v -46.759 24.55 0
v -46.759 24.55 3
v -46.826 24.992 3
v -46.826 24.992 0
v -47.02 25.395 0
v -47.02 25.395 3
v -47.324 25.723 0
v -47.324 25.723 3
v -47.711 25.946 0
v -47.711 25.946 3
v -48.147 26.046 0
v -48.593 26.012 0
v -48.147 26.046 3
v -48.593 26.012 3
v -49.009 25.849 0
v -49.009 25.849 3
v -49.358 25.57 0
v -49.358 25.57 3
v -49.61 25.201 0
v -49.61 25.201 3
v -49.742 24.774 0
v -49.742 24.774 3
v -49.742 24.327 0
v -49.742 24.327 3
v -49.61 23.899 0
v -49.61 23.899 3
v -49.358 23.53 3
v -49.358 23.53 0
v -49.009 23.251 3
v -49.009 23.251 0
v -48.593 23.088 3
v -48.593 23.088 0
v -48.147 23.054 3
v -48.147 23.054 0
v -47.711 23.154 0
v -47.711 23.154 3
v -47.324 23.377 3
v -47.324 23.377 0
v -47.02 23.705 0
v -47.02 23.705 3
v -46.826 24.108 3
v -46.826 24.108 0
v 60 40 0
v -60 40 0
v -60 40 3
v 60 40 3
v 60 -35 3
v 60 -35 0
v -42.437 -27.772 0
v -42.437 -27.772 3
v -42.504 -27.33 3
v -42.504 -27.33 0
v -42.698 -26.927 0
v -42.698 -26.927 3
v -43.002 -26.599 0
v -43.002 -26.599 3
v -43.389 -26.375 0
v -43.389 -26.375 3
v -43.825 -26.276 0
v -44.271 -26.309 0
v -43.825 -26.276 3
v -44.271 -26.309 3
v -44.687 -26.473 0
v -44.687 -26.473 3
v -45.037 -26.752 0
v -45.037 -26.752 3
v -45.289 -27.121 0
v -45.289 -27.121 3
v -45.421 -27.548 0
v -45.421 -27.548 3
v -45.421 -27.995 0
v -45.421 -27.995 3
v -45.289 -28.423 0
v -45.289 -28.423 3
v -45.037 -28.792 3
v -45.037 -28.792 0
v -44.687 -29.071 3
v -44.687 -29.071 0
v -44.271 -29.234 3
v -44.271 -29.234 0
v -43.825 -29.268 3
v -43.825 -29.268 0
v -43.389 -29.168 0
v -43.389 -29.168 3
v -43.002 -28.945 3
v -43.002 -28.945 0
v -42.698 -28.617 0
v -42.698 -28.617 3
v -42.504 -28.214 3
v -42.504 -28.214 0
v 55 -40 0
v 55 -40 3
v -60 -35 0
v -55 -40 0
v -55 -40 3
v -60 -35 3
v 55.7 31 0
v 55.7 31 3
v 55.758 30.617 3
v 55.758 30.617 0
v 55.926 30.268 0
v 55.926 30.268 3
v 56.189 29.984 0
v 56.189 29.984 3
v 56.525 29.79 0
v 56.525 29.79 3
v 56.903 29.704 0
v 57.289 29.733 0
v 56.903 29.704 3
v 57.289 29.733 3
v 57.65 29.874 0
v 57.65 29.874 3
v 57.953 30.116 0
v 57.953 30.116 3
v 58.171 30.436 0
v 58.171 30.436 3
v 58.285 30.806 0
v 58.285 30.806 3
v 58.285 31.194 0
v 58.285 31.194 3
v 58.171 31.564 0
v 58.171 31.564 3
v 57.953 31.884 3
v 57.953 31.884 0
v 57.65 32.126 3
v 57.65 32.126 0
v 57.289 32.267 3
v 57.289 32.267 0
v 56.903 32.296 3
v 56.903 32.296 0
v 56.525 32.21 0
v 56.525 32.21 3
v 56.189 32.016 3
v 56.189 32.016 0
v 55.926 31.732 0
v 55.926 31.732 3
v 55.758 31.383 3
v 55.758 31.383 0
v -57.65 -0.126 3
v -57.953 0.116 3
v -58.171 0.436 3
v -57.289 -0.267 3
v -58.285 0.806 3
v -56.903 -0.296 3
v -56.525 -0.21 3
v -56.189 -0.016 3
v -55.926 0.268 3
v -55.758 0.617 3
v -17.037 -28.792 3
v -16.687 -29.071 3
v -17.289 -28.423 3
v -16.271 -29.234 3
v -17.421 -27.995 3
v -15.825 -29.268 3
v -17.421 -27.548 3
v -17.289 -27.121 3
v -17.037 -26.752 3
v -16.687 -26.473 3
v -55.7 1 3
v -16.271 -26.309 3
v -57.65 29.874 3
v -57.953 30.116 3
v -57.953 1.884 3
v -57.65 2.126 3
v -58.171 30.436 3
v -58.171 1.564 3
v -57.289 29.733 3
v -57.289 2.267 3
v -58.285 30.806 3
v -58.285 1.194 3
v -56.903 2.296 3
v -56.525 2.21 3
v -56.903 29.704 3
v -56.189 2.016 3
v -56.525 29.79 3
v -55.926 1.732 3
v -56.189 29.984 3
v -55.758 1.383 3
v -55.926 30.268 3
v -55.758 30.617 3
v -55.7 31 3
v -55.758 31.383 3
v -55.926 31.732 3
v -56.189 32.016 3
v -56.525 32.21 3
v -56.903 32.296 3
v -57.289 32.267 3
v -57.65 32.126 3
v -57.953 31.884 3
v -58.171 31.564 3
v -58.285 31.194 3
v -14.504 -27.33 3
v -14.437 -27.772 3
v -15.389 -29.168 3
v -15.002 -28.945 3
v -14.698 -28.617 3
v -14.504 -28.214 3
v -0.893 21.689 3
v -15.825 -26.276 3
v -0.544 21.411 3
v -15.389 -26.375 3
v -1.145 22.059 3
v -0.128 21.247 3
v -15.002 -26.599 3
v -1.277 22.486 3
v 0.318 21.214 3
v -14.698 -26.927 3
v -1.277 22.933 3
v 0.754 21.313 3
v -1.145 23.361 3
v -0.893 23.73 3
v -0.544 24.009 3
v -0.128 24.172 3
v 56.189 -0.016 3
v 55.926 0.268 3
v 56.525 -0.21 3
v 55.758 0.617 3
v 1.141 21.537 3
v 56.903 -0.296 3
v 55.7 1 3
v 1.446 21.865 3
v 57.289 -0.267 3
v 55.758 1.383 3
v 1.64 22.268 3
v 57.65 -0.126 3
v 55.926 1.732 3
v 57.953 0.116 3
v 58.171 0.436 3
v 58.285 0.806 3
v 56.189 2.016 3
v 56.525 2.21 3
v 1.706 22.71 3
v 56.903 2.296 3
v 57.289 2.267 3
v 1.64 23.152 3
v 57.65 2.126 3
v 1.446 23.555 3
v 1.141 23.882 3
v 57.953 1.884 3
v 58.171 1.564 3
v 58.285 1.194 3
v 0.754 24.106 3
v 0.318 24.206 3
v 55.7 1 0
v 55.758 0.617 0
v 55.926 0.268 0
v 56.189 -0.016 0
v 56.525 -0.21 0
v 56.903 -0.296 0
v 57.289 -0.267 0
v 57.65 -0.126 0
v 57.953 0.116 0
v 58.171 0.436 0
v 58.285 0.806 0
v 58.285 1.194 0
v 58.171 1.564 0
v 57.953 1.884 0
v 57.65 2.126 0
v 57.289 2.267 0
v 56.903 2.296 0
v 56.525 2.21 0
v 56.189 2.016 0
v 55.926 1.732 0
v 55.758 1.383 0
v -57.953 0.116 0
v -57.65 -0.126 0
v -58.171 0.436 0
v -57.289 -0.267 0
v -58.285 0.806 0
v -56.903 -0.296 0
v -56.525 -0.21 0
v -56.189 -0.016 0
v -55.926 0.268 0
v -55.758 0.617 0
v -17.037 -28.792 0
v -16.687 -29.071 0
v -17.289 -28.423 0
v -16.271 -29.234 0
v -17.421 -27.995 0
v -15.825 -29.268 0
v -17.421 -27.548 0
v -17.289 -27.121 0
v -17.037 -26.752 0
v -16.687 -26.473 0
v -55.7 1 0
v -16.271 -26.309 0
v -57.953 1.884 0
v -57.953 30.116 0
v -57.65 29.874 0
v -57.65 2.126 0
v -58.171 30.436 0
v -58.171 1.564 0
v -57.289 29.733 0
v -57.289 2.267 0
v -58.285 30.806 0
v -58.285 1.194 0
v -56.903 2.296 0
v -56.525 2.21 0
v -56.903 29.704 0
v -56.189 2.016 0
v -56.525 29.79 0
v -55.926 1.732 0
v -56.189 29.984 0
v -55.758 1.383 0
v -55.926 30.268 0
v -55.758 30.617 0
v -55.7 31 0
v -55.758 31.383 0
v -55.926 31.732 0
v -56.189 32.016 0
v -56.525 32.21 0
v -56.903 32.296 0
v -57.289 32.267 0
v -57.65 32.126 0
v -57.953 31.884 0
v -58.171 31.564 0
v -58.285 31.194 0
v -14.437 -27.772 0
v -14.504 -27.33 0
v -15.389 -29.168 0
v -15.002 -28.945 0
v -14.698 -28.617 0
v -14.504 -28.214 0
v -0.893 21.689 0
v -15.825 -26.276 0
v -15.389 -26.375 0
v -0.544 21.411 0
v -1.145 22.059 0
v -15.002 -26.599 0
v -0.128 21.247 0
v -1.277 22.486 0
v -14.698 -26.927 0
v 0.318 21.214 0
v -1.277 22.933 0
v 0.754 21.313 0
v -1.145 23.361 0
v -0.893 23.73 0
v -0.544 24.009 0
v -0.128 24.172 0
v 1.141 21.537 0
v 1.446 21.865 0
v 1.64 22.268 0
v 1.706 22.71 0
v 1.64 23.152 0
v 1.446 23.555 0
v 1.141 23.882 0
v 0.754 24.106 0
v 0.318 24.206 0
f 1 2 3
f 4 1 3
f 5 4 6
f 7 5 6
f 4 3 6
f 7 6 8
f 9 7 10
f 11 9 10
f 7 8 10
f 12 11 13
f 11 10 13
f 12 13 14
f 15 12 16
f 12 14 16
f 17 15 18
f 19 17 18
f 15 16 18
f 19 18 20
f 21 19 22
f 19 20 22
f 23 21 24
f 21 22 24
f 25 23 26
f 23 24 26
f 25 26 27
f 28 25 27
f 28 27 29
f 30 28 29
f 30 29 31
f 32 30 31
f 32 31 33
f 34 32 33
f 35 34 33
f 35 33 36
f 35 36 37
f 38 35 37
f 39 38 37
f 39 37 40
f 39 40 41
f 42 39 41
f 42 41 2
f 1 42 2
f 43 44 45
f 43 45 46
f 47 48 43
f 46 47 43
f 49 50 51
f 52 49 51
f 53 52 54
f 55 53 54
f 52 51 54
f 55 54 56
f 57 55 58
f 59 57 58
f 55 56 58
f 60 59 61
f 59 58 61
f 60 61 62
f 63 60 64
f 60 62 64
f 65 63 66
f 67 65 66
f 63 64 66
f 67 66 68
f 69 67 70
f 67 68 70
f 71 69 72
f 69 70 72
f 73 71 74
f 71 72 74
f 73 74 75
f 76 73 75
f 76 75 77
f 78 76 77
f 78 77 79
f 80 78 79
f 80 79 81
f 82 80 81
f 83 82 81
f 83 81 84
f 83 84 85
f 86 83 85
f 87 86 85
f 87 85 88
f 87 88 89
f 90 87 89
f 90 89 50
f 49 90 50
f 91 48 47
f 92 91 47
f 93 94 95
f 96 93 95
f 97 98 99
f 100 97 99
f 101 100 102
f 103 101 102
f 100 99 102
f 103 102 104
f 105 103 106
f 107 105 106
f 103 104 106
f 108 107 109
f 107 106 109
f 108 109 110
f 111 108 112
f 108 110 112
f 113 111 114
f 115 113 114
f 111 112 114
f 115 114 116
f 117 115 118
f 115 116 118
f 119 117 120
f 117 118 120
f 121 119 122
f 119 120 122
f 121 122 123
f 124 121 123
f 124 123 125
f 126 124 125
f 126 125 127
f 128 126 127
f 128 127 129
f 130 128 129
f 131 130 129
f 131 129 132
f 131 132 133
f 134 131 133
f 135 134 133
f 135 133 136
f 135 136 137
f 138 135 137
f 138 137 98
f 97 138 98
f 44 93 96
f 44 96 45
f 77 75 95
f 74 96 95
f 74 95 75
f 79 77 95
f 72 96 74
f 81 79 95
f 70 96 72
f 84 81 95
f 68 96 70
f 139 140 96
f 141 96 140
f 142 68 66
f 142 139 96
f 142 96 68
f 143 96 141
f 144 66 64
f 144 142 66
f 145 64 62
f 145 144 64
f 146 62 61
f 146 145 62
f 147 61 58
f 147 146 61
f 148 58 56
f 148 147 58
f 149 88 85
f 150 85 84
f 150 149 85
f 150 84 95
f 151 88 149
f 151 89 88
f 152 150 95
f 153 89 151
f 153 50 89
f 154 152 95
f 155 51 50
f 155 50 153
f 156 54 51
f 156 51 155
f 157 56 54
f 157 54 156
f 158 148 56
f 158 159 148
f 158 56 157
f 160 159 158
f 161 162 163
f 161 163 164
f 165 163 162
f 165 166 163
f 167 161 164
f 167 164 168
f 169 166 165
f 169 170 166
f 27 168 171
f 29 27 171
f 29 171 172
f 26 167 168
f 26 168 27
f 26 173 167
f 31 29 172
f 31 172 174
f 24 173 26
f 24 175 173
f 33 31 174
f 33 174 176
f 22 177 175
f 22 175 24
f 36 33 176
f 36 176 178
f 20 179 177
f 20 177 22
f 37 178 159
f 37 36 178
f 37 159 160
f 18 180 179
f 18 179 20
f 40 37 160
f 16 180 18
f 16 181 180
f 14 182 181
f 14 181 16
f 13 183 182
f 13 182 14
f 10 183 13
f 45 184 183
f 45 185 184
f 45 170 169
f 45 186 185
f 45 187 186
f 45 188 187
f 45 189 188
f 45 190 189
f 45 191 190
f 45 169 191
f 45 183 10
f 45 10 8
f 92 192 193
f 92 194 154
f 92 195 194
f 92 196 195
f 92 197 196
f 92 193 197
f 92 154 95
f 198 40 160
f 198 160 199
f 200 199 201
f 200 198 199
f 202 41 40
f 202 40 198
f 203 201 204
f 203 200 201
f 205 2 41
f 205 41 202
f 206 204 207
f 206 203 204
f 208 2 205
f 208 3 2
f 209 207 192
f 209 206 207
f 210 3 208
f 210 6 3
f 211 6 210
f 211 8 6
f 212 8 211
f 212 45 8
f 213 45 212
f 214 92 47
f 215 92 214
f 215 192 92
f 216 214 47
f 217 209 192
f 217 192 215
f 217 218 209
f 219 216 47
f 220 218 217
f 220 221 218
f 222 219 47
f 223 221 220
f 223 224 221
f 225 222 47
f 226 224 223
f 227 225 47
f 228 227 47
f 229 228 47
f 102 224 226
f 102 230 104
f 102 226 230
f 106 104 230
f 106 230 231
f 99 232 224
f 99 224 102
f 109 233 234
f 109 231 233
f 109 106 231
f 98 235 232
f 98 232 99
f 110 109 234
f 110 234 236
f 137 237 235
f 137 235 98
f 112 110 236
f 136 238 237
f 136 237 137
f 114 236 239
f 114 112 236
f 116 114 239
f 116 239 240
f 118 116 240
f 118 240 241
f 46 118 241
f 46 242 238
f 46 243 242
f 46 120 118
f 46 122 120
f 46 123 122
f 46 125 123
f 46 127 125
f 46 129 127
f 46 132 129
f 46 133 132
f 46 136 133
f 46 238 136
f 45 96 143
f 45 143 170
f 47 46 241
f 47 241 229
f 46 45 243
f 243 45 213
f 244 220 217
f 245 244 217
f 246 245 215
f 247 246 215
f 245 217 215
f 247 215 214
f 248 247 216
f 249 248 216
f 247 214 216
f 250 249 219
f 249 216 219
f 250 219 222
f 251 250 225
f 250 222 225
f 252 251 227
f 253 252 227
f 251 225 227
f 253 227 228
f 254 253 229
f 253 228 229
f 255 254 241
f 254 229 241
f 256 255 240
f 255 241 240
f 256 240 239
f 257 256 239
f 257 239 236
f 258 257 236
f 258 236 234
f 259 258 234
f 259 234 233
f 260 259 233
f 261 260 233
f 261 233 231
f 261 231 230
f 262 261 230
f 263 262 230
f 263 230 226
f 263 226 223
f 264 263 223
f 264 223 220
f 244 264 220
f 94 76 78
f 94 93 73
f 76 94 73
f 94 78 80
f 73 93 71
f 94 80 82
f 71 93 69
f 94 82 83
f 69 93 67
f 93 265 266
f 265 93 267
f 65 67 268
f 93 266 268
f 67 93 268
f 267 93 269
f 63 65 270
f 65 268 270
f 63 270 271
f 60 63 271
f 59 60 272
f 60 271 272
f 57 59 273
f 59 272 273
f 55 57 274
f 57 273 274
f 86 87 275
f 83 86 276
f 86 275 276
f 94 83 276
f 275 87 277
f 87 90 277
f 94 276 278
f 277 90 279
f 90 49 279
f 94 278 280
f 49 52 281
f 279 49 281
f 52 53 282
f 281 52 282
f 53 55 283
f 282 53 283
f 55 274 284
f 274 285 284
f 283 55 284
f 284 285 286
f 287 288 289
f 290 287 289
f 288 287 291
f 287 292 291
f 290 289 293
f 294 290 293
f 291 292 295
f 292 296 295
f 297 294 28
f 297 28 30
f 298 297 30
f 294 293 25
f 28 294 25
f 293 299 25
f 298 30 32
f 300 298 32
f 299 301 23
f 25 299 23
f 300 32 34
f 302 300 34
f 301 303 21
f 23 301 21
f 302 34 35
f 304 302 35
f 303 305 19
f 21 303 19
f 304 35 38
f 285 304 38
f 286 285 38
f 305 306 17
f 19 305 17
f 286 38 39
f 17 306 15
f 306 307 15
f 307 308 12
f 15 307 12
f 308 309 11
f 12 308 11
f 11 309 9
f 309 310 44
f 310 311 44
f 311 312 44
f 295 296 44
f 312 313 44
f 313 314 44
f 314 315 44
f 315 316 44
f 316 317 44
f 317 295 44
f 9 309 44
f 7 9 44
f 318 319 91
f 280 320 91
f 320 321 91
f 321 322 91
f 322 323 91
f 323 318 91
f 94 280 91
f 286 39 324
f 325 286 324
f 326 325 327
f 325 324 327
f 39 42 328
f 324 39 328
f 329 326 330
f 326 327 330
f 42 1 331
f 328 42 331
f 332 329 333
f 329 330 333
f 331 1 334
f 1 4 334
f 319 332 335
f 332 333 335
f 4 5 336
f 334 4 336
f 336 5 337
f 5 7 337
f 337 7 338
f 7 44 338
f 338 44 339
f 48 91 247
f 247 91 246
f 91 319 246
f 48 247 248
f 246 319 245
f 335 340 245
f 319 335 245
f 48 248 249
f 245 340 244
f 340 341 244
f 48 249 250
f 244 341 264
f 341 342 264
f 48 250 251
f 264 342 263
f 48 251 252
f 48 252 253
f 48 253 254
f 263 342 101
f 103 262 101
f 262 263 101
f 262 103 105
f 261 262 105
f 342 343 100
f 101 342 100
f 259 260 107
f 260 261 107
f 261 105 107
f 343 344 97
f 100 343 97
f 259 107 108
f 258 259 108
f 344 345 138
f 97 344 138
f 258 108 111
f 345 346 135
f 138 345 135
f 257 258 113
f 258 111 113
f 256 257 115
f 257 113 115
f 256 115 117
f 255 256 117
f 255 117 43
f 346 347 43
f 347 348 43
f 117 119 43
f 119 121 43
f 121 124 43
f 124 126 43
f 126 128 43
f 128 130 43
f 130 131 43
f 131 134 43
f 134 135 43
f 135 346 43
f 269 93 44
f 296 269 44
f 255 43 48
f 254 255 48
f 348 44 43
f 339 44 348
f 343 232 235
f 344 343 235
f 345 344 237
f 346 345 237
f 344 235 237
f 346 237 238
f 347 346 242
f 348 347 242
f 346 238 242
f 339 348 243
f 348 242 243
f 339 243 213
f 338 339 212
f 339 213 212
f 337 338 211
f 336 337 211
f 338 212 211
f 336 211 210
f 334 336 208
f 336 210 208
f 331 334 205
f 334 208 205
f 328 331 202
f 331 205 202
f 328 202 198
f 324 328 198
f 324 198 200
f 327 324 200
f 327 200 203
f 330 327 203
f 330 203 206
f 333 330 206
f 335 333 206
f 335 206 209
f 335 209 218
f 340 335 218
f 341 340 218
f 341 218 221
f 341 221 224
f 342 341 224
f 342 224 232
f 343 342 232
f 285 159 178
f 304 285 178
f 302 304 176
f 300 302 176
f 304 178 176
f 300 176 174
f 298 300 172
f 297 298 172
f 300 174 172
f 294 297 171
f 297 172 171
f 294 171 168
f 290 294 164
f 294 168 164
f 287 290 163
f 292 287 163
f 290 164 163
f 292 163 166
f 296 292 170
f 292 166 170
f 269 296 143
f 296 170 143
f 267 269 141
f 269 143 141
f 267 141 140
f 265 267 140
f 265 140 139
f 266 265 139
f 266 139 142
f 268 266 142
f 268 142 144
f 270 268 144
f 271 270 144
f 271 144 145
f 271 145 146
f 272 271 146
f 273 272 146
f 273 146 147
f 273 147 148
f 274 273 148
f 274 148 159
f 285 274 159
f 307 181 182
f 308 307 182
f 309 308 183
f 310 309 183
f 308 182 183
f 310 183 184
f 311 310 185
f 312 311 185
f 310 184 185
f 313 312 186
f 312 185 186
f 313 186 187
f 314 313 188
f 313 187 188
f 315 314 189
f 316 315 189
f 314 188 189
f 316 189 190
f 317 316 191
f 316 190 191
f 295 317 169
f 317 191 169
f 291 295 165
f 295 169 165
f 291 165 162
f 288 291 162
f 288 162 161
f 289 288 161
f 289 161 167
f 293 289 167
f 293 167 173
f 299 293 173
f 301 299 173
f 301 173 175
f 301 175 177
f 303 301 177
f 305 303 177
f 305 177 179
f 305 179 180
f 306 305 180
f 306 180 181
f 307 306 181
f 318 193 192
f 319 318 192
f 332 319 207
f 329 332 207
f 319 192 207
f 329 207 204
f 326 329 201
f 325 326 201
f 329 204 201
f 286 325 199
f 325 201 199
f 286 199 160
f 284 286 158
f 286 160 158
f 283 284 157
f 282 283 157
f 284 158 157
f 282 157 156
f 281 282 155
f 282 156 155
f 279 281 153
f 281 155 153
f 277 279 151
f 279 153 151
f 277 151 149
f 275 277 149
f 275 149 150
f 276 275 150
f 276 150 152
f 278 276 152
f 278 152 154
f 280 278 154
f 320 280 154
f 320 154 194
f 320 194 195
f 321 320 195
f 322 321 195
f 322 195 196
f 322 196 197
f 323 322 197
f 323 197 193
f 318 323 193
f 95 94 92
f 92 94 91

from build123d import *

# Parameters (mm, degrees)
SKETCH_1_W          = 120
SKETCH_1_H          = 80
EXTRUDE_1_DEPTH     = 3
SKETCH_2_R          = 1.3
CUT_EXTRUDE_1_DEPTH = 73.173402303
SKETCH_3_R          = 1.5
CUT_EXTRUDE_2_DEPTH = 73.173402303
CHAMFER_1_SIZE      = 5


with BuildPart() as part:
    # 草图1 → 凸台-拉伸1 (new body)
    with BuildSketch(Plane.XY):
        Rectangle(SKETCH_1_W, SKETCH_1_H)
    extrude(amount=EXTRUDE_1_DEPTH)

    # 草图2 → 切除-拉伸1 (cut, through all)
    with BuildSketch(Plane.XY.offset(3)):
        with Locations((-57, 31)):
            Circle(SKETCH_2_R)
        with Locations((-57, 1)):
            Circle(SKETCH_2_R)
        with Locations(Location((57, 31, 0), (0, 0, 180))):
            Circle(SKETCH_2_R)
        with Locations(Location((57, 1, 0), (0, 0, 180))):
            Circle(SKETCH_2_R)
    extrude(amount=-CUT_EXTRUDE_1_DEPTH, mode=Mode.SUBTRACT)

    # 草图3 → 切除-拉伸2 (cut, through all)
    with BuildSketch(Plane.XY.offset(3)):
        with Locations((-43.937436438, -27.771775862)):
            Circle(SKETCH_3_R)
        with Locations((-15.937436438, -27.771775862)):
            Circle(SKETCH_3_R)
        with Locations((-48.258865009, 24.55006714)):
            Circle(SKETCH_3_R)
        with Locations((0.206206662, 22.7097335)):
            Circle(SKETCH_3_R)
    extrude(amount=-CUT_EXTRUDE_2_DEPTH, mode=Mode.SUBTRACT)

    # 倒角1
    chamfer_1_edges = [part.edges().sort_by_distance(p)[0] for p in [
        (60, -40, 1.5),
        (-60, -40, 1.5),
    ]]
    chamfer(chamfer_1_edges, length=CHAMFER_1_SIZE)


solid = part.part
